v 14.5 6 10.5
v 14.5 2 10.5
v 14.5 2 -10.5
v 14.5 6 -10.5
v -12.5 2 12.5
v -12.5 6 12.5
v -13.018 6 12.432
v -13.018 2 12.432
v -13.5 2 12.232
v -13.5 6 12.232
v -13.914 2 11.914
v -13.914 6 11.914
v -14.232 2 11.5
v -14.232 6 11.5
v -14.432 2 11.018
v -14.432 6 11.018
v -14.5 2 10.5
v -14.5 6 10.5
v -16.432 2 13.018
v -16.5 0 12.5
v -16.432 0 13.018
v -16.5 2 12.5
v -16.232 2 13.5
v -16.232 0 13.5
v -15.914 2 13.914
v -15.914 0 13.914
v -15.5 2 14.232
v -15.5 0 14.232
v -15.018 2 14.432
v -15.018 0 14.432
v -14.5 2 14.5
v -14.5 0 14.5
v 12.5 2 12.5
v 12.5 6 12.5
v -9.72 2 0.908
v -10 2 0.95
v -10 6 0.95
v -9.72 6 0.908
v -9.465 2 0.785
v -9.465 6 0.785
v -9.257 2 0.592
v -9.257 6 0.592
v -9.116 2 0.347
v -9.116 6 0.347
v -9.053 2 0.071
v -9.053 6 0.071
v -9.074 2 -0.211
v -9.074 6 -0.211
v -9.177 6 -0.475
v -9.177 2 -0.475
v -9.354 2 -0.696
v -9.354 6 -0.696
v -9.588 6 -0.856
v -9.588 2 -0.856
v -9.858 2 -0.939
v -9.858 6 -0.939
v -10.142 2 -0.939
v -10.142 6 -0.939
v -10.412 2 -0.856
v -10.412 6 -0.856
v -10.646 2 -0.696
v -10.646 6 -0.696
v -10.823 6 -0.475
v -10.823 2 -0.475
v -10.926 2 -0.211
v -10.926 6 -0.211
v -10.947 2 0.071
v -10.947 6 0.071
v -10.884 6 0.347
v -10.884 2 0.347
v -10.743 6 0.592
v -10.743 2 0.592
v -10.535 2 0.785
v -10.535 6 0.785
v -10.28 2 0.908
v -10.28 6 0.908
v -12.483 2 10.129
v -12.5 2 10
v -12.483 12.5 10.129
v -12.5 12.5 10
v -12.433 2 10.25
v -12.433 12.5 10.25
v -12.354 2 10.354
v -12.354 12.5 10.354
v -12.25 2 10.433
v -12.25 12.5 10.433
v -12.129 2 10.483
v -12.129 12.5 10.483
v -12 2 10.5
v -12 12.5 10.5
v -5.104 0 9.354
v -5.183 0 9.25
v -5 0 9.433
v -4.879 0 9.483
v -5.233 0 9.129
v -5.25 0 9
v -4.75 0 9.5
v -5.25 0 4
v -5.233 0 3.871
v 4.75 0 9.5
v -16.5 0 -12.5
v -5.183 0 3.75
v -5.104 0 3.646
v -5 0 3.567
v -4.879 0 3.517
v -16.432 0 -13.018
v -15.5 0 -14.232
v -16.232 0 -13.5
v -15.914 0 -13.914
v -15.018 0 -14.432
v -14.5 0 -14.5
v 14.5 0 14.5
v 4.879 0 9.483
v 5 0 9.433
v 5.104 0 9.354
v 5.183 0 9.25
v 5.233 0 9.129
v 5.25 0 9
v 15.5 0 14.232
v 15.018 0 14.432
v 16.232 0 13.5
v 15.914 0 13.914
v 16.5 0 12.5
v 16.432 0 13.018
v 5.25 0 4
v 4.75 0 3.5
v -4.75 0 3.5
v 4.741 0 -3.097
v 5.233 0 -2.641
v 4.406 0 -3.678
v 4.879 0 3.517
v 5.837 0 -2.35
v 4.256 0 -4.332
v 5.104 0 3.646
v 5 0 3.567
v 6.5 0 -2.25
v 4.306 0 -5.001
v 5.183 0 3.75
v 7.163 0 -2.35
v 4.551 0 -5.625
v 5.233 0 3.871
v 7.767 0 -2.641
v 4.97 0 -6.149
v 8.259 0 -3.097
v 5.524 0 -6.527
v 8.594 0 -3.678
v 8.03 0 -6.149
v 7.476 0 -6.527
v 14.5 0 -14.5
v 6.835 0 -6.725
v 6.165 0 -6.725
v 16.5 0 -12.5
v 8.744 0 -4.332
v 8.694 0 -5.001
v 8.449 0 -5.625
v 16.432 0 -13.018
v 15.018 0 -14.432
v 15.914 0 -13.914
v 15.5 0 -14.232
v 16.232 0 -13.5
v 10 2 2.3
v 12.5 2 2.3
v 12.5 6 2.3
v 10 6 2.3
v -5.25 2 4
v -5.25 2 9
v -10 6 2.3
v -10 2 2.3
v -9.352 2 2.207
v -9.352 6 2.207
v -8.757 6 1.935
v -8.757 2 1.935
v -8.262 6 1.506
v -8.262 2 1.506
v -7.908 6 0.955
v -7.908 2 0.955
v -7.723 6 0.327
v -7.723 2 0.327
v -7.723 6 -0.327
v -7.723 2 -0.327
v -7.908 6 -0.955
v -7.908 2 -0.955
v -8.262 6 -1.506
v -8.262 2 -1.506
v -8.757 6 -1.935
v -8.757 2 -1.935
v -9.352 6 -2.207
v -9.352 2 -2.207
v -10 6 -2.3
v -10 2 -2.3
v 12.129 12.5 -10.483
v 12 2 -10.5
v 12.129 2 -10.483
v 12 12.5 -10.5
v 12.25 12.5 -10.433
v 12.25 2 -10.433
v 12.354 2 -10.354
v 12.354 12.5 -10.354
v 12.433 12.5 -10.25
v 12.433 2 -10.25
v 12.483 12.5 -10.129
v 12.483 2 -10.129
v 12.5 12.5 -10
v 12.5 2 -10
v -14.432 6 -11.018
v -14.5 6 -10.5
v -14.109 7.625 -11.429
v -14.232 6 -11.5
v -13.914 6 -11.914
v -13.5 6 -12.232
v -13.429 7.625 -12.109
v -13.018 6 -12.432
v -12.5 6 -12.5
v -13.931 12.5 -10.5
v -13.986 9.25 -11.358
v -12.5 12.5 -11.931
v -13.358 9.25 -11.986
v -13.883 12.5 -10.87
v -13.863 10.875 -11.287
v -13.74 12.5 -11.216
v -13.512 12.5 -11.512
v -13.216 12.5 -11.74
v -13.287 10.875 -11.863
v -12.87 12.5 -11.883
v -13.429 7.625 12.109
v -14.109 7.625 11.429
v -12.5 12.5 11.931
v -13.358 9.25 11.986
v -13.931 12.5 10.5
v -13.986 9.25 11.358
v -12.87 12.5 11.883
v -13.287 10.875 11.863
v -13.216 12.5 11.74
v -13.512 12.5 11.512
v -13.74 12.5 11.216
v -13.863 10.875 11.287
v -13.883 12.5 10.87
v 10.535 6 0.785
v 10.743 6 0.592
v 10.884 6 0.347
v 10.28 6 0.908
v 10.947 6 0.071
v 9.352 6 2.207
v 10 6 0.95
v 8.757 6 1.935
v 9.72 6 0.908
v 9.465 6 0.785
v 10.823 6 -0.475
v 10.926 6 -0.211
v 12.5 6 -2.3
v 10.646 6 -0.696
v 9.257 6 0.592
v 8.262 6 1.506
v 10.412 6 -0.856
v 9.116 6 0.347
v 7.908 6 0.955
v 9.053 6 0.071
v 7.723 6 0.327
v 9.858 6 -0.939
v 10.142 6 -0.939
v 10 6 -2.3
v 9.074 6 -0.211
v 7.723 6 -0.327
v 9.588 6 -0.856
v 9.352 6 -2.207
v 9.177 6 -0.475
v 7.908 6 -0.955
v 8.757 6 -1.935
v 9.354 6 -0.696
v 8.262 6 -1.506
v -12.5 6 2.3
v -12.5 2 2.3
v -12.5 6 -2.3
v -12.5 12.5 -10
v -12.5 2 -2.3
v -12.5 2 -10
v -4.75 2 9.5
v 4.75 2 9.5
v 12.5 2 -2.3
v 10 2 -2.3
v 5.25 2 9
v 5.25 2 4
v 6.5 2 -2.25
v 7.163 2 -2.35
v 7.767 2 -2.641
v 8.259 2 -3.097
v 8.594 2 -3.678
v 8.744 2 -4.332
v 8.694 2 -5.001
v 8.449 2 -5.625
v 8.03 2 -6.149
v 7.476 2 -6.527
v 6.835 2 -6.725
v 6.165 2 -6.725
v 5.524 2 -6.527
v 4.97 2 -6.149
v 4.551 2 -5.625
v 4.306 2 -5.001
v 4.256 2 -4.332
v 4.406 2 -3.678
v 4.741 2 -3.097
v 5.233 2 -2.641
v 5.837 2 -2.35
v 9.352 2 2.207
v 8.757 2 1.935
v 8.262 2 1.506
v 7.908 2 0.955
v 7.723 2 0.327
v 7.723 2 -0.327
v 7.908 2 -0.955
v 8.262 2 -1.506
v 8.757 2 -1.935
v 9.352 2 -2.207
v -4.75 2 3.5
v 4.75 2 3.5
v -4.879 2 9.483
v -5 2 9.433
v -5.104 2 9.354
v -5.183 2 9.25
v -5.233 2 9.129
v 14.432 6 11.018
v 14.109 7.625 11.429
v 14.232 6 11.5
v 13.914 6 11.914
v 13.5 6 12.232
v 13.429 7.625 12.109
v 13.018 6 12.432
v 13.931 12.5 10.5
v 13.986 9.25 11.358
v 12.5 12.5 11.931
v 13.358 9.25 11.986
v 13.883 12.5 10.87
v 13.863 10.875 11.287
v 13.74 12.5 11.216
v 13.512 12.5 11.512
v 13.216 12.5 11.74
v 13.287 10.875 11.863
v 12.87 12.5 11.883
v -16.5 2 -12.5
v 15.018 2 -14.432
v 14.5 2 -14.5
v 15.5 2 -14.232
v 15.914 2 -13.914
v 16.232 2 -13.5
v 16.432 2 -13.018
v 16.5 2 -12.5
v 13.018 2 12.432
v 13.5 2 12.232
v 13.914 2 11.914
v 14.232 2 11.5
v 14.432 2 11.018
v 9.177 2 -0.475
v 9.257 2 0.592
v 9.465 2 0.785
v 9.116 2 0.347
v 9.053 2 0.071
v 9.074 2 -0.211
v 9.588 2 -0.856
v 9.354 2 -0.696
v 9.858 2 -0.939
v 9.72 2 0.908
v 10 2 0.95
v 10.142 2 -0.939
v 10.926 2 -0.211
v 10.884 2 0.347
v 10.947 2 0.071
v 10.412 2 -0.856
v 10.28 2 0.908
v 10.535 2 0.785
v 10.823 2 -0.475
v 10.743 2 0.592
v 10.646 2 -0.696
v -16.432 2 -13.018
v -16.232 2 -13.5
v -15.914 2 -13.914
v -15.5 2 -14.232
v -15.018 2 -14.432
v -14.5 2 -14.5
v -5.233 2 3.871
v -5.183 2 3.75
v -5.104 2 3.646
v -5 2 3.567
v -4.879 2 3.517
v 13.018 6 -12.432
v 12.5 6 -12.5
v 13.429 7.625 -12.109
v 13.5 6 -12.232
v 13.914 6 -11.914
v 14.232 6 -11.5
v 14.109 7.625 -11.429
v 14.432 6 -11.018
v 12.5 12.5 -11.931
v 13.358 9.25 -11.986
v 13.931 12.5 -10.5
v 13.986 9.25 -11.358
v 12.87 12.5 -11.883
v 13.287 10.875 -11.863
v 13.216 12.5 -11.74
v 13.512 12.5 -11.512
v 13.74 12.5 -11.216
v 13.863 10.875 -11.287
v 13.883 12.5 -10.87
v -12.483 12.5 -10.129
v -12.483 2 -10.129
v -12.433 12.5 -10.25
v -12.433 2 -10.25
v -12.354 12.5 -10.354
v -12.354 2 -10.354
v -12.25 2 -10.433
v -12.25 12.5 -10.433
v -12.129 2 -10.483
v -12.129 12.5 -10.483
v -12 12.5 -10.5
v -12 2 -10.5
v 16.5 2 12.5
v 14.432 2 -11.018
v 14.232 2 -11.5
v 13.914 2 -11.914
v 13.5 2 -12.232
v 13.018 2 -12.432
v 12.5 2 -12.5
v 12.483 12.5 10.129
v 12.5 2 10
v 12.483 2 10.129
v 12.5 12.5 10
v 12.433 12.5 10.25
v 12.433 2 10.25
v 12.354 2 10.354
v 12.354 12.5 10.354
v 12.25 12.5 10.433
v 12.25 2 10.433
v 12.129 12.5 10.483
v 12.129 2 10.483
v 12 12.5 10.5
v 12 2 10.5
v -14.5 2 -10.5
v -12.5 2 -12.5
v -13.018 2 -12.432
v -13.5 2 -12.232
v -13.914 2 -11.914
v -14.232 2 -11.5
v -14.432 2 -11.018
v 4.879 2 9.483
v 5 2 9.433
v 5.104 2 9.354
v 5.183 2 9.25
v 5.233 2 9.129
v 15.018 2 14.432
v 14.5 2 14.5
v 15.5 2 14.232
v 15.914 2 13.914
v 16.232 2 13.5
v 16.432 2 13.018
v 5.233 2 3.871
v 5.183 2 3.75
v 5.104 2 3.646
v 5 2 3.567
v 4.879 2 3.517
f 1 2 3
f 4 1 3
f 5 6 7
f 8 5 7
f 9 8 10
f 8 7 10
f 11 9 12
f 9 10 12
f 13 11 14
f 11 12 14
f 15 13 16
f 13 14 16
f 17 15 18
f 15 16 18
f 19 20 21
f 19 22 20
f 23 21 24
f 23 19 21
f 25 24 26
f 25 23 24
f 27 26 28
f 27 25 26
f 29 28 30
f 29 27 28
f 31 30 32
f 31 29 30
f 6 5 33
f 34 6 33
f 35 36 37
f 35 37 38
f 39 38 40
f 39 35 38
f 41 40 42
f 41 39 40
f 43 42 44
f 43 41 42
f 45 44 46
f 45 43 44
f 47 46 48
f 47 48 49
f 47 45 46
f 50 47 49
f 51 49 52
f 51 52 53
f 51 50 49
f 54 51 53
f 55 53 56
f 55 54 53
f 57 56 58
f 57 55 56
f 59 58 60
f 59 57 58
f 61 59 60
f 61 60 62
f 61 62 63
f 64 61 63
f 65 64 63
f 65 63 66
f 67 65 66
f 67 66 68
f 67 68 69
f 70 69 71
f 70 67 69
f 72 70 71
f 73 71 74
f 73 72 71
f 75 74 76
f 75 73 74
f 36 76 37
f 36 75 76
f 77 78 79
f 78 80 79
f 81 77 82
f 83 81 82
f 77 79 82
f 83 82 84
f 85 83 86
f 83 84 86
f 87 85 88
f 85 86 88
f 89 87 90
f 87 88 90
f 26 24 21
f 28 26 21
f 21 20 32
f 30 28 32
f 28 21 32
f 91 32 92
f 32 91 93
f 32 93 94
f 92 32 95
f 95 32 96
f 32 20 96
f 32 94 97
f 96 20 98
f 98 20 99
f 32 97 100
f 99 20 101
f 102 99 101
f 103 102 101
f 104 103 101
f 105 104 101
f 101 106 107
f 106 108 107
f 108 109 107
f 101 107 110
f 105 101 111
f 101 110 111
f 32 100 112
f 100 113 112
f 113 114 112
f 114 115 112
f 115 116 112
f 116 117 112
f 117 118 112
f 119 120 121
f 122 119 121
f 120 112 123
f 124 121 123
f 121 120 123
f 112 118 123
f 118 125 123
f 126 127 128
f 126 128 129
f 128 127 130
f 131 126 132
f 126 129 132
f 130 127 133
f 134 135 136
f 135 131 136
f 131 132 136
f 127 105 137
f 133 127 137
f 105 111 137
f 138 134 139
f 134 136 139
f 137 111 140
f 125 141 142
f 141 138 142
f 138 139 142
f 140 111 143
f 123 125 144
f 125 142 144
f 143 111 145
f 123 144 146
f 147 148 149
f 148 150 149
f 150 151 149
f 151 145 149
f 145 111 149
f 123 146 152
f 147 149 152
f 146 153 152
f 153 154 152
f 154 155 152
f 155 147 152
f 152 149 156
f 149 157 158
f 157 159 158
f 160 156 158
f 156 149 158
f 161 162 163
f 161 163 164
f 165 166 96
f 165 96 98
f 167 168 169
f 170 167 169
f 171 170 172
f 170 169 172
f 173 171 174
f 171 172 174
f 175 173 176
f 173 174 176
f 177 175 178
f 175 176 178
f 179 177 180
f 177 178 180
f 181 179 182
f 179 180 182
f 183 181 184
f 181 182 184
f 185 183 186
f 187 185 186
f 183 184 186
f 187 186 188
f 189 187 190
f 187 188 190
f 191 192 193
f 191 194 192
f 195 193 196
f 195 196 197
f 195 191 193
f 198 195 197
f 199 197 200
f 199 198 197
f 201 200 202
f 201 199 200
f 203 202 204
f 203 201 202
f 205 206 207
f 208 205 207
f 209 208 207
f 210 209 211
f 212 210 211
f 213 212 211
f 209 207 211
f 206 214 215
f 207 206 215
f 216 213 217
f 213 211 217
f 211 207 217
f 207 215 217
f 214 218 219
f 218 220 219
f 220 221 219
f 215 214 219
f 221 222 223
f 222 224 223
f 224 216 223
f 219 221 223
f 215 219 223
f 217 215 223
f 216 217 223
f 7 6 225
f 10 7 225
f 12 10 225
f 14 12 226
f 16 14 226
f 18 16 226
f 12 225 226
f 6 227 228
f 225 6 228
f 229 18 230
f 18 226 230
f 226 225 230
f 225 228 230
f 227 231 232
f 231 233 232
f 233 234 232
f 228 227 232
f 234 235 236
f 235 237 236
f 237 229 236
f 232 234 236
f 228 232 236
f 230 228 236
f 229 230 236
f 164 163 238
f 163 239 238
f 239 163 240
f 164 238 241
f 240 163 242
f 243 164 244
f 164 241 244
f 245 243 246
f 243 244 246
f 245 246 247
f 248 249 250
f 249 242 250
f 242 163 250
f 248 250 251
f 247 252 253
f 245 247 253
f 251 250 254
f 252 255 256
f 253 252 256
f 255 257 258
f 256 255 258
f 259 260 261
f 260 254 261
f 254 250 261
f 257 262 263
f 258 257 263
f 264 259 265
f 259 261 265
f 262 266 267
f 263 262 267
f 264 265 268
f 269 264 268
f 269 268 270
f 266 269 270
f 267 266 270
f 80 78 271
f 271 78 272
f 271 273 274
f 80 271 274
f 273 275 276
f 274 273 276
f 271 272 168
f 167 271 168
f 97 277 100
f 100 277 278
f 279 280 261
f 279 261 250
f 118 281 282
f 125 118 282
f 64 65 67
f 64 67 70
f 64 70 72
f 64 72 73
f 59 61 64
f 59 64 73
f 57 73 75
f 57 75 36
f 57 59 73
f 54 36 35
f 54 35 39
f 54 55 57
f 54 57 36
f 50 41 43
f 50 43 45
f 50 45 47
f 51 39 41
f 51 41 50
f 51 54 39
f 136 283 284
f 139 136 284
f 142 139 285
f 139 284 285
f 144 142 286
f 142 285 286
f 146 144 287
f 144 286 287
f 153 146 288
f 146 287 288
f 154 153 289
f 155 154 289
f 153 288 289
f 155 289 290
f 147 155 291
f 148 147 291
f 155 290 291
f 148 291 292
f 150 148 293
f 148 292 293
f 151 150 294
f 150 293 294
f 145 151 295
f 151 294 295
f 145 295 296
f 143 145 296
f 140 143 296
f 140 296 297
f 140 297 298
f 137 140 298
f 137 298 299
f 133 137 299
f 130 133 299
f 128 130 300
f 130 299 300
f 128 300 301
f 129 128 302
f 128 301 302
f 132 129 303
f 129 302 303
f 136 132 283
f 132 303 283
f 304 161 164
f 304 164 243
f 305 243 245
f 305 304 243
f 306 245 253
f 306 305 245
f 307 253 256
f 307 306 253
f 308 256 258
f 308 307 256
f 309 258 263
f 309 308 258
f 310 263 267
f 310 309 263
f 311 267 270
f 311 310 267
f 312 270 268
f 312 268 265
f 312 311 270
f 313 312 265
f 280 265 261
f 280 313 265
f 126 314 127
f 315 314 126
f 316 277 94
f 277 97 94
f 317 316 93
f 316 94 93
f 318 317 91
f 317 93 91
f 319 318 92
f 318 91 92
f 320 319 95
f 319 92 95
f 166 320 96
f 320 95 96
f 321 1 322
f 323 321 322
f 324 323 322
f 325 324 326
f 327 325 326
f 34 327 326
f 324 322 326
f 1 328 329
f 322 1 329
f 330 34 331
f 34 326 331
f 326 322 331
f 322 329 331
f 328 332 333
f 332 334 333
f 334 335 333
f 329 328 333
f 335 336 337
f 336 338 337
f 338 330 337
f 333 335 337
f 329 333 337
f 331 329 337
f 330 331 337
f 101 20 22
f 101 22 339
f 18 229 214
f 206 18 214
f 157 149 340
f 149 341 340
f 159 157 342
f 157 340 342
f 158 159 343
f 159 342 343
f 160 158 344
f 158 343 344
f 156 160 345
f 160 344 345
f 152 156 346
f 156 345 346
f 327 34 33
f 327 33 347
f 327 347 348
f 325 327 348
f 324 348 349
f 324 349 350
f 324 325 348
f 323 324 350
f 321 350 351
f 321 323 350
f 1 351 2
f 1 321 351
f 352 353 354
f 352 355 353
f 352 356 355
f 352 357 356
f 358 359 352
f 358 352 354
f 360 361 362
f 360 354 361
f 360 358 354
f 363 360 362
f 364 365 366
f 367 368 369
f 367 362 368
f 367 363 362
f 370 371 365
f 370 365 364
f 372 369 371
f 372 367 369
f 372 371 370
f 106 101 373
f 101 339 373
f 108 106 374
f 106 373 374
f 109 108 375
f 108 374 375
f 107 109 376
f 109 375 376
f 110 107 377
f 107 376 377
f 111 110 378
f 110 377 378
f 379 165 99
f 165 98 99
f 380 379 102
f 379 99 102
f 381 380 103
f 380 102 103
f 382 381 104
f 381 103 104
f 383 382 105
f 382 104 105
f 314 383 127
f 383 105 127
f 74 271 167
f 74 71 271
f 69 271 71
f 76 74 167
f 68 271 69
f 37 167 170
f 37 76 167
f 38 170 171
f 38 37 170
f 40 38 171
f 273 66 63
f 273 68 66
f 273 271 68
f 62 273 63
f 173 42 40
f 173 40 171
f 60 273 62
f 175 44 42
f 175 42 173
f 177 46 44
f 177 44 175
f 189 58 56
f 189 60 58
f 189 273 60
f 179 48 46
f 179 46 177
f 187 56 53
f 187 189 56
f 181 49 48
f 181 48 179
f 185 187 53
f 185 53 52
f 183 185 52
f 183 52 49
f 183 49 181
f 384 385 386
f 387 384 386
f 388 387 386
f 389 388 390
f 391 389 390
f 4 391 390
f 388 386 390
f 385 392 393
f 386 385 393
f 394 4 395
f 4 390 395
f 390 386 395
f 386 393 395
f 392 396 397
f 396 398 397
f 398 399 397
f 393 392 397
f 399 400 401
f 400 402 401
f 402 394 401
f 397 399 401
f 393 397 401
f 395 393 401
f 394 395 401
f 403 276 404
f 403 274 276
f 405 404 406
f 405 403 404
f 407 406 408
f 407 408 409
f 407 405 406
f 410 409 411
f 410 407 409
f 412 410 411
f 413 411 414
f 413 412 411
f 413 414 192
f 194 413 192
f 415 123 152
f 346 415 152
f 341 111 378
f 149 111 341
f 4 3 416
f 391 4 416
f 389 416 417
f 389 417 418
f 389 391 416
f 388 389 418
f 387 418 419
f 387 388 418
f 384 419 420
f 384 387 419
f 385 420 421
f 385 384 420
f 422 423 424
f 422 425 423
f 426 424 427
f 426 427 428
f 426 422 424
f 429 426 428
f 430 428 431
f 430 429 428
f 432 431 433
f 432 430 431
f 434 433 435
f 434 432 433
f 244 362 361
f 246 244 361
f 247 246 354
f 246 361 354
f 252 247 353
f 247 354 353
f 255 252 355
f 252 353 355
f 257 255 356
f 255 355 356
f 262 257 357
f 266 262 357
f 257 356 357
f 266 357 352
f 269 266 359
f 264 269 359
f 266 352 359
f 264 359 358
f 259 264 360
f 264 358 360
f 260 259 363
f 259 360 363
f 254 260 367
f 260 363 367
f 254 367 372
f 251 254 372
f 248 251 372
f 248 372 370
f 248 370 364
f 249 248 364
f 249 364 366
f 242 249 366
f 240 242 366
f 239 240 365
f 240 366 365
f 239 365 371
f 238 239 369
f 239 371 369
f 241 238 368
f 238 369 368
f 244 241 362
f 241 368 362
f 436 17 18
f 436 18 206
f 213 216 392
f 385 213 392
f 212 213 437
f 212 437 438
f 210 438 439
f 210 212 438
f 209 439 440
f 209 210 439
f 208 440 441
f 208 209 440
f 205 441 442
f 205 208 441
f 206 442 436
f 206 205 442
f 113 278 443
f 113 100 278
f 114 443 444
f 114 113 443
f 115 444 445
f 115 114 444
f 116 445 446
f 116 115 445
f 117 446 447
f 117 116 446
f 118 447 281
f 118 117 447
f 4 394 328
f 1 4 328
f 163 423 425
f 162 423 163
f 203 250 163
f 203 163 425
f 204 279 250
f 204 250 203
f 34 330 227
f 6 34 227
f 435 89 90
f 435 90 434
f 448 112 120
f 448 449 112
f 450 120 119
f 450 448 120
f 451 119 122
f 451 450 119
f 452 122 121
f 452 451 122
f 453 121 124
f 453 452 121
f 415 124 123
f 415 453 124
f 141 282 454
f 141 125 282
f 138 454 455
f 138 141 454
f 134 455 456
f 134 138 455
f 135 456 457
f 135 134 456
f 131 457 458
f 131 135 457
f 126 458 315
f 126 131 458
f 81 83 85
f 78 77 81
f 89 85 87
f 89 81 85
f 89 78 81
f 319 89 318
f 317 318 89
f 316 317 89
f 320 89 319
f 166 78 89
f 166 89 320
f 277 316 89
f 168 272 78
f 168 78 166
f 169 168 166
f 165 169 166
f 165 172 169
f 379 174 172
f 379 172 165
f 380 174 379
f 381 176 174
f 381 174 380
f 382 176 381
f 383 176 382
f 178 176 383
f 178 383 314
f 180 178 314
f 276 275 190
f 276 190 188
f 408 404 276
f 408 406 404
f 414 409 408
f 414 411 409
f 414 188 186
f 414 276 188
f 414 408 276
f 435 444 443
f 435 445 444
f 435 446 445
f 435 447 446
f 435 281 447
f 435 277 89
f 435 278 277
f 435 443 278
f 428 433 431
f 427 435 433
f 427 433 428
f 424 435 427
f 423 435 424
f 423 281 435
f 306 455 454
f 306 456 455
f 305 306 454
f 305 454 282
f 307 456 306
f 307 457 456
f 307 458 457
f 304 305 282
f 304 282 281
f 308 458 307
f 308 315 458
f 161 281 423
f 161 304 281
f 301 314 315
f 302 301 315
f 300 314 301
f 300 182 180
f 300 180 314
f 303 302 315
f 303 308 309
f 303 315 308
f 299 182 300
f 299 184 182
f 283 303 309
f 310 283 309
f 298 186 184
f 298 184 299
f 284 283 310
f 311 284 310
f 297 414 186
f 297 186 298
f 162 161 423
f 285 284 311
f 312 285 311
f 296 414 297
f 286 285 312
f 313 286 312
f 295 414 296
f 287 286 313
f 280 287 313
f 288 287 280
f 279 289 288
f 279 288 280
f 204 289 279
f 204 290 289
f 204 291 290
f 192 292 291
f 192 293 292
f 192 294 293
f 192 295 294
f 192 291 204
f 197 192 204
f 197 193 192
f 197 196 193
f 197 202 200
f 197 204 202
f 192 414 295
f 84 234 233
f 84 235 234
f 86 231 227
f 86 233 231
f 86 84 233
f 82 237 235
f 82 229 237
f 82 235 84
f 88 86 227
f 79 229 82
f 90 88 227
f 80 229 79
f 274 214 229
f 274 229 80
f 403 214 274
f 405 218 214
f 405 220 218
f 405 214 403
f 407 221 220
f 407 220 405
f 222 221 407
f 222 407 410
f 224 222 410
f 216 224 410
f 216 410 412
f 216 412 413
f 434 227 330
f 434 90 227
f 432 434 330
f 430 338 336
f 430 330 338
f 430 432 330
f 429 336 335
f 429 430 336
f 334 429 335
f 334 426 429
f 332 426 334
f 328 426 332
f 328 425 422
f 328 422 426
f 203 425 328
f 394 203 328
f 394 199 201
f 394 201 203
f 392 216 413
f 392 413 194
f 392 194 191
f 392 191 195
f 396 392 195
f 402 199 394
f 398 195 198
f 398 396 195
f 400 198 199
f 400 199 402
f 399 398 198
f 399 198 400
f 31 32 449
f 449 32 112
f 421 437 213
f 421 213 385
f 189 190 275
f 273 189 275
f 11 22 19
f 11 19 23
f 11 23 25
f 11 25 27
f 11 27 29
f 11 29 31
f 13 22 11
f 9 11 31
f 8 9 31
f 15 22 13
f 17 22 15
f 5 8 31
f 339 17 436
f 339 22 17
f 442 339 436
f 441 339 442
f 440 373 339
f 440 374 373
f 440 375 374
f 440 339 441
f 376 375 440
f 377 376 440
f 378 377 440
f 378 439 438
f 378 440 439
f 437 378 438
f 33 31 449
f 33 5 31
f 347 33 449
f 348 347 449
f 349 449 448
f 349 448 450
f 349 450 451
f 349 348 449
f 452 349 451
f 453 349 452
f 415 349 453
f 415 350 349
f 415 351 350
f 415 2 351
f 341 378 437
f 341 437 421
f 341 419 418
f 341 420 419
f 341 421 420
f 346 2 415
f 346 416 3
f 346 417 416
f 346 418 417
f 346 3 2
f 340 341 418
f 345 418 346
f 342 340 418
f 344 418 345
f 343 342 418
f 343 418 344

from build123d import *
from OCP.BRepFilletAPI import BRepFilletAPI_MakeChamfer

# Parameters (mm, degrees)
SKETCH1_W           = 33
SKETCH1_H           = 29
BOSS_EXTRUDE1_DEPTH = 2
SKETCH2_W           = 29
SKETCH2_H           = 25
SKETCH2_W_2         = 25
SKETCH2_H_2         = 21
BOSS_EXTRUDE2_DEPTH = 10.5
SKETCH3_W           = 10.5
SKETCH3_H           = 6
CUT_EXTRUDE1_DEPTH  = 2
SKETCH4_R           = 2.25
CUT_EXTRUDE2_DEPTH  = 2
SKETCH5_R           = 0.95
BOSS_EXTRUDE3_DEPTH = 4
FILLET1_R           = 2
FILLET2_R           = 0.5
CHAMFER1_SIZE       = 6.5
CHAMFER1_SIZE2      = 0.568676313


with BuildPart() as part:
    # Sketch1 → Boss-Extrude1 (new body)
    with BuildSketch(Plane(origin=(0, 0, 0), x_dir=(1, 0, 0), z_dir=(0, 1, 0))):
        Rectangle(SKETCH1_W, SKETCH1_H)
    extrude(amount=BOSS_EXTRUDE1_DEPTH)

    # Sketch2 → Boss-Extrude2 (add)
    with BuildSketch(Plane(origin=(0, 2, 0), x_dir=(1, 0, 0), z_dir=(0, 1, 0))):
        Rectangle(SKETCH2_W, SKETCH2_H)
        Rectangle(SKETCH2_W_2, SKETCH2_H_2, mode=Mode.SUBTRACT)
    extrude(amount=BOSS_EXTRUDE2_DEPTH)

    # Sketch3 → Cut-Extrude1 (cut)
    with BuildSketch(Plane(origin=(0, 2, 0), x_dir=(1, 0, 0), z_dir=(0, 1, 0))):
        with Locations((0, -6.5)):
            Rectangle(SKETCH3_W, SKETCH3_H)
    extrude(amount=-CUT_EXTRUDE1_DEPTH, mode=Mode.SUBTRACT)

    # Sketch4 → Cut-Extrude2 (cut)
    with BuildSketch(Plane(origin=(0, 2, 0), x_dir=(1, 0, 0), z_dir=(0, 1, 0))):
        with Locations(Location((6.5, 4.5, 0), (0, 0, 270))):
            Circle(SKETCH4_R)
    extrude(amount=-CUT_EXTRUDE2_DEPTH, mode=Mode.SUBTRACT)

    # Sketch5 → Boss-Extrude3 (add)
    with BuildSketch(Plane(origin=(0, 2, 0), x_dir=(1, 0, 0), z_dir=(0, 1, 0))):
        with BuildLine():
            Line((-10, 2.3), (-12.5, 2.3))
            Line((-12.5, 2.3), (-12.5, -2.3))
            Line((-12.5, -2.3), (-10, -2.3))
            ThreePointArc((-10, -2.3), (-7.7, 0), (-10, 2.3))
        make_face()
        with Locations(Location((-10, 0, 0), (0, 0, 270))):
            Circle(SKETCH5_R, mode=Mode.SUBTRACT)
    boss_extrude3 = extrude(amount=BOSS_EXTRUDE3_DEPTH)

    # Mirror1: Boss-Extrude3 across plane
    add(boss_extrude3.mirror(Plane(origin=(0, 0, 0), x_dir=(0, 0, 1), z_dir=(1, 0, 0))))

    # Fillet1
    fillet1_edges = [part.edges().sort_by_distance(p)[0] for p in [
        (14.5, 7.25, 12.5),
        (14.5, 7.25, -12.5),
        (-14.5, 7.25, -12.5),
        (-14.5, 7.25, 12.5),
        (16.5, 1, 14.5),
        (-16.5, 1, 14.5),
        (-16.5, 1, -14.5),
        (16.5, 1, -14.5),
    ]]
    fillet(fillet1_edges, radius=FILLET1_R)

    # Fillet2
    fillet2_edges = [part.edges().sort_by_distance(p)[0] for p in [
        (12.5, 7.25, -10.5),
        (-12.5, 7.25, -10.5),
        (-12.5, 7.25, 10.5),
        (12.5, 7.25, 10.5),
        (-5.25, 1, 3.5),
        (-5.25, 1, 9.5),
        (5.25, 1, 9.5),
        (5.25, 1, 3.5),
    ]]
    fillet(fillet2_edges, radius=FILLET2_R)

    # Chamfer1: one chamfer whose edges measure the first distance from different faces: ONE call of the kernel's chamfer builder (chamfer() names one face for all edges)
    chamfer1_edges_1 = [part.edges().sort_by_distance(p)[0] for p in [
        (-14.5, 12.5, 0),
    ]]
    chamfer1_side_1 = [part.faces().sort_by_distance(p)[0] for p in [
        (-14.5, 7.25, 0),
    ]]
    chamfer1_edges_2 = [part.edges().sort_by_distance(p)[0] for p in [
        (0, 12.5, -12.5),
    ]]
    chamfer1_side_2 = [part.faces().sort_by_distance(p)[0] for p in [
        (0, 7.25, -12.5),
    ]]
    chamfer1_edges_3 = [part.edges().sort_by_distance(p)[0] for p in [
        (14.5, 12.5, 0),
    ]]
    chamfer1_side_3 = [part.faces().sort_by_distance(p)[0] for p in [
        (14.5, 7.25, 0),
    ]]
    chamfer1_edges_4 = [part.edges().sort_by_distance(p)[0] for p in [
        (0, 12.5, 12.5),
    ]]
    chamfer1_side_4 = [part.faces().sort_by_distance(p)[0] for p in [
        (0, 7.25, 12.5),
    ]]
    chamfer1_edges_5 = [part.edges().sort_by_distance(p)[0] for p in [
        (13.914213562, 12.5, -11.914213562),
    ]]
    chamfer1_side_5 = [part.faces().sort_by_distance(p)[0] for p in [
        (13.914213562, 7.25, -11.914213562),
    ]]
    chamfer1_edges_6 = [part.edges().sort_by_distance(p)[0] for p in [
        (13.914213562, 12.5, 11.914213562),
    ]]
    chamfer1_side_6 = [part.faces().sort_by_distance(p)[0] for p in [
        (13.914213562, 7.25, 11.914213562),
    ]]
    chamfer1_edges_7 = [part.edges().sort_by_distance(p)[0] for p in [
        (-13.914213562, 12.5, 11.914213562),
    ]]
    chamfer1_side_7 = [part.faces().sort_by_distance(p)[0] for p in [
        (-13.914213562, 7.25, 11.914213562),
    ]]
    chamfer1_edges_8 = [part.edges().sort_by_distance(p)[0] for p in [
        (-13.914213562, 12.5, -11.914213562),
    ]]
    chamfer1_side_8 = [part.faces().sort_by_distance(p)[0] for p in [
        (-13.914213562, 7.25, -11.914213562),
    ]]
    chamfer1 = BRepFilletAPI_MakeChamfer(part.part.solid().wrapped)
    for e in chamfer1_edges_1:
        chamfer1.Add(CHAMFER1_SIZE, CHAMFER1_SIZE2, e.wrapped, chamfer1_side_1[0].wrapped)  # the first distance lies on this face
    for e in chamfer1_edges_2:
        chamfer1.Add(CHAMFER1_SIZE, CHAMFER1_SIZE2, e.wrapped, chamfer1_side_2[0].wrapped)  # the first distance lies on this face
    for e in chamfer1_edges_3:
        chamfer1.Add(CHAMFER1_SIZE, CHAMFER1_SIZE2, e.wrapped, chamfer1_side_3[0].wrapped)  # the first distance lies on this face
    for e in chamfer1_edges_4:
        chamfer1.Add(CHAMFER1_SIZE, CHAMFER1_SIZE2, e.wrapped, chamfer1_side_4[0].wrapped)  # the first distance lies on this face
    for e in chamfer1_edges_5:
        chamfer1.Add(CHAMFER1_SIZE, CHAMFER1_SIZE2, e.wrapped, chamfer1_side_5[0].wrapped)  # the first distance lies on this face
    for e in chamfer1_edges_6:
        chamfer1.Add(CHAMFER1_SIZE, CHAMFER1_SIZE2, e.wrapped, chamfer1_side_6[0].wrapped)  # the first distance lies on this face
    for e in chamfer1_edges_7:
        chamfer1.Add(CHAMFER1_SIZE, CHAMFER1_SIZE2, e.wrapped, chamfer1_side_7[0].wrapped)  # the first distance lies on this face
    for e in chamfer1_edges_8:
        chamfer1.Add(CHAMFER1_SIZE, CHAMFER1_SIZE2, e.wrapped, chamfer1_side_8[0].wrapped)  # the first distance lies on this face
    add(Compound.cast(chamfer1.Shape()), mode=Mode.REPLACE)


solid = part.part
